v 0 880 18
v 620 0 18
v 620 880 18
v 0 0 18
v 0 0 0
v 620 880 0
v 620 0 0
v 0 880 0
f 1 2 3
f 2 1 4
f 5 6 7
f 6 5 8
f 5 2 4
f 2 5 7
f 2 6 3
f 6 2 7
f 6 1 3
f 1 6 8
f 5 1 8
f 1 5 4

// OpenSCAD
// Base plate component.
// Open this file directly in OpenSCAD to tune and render the part.

/* [Dimensions] */
plate_width = 620;
plate_depth = 880;
plate_thickness = 18;

module base_plate(width, depth, thickness) {
    cube([width, depth, thickness]);
}

// Standalone component preview/render.
base_plate(plate_width, plate_depth, plate_thickness);
